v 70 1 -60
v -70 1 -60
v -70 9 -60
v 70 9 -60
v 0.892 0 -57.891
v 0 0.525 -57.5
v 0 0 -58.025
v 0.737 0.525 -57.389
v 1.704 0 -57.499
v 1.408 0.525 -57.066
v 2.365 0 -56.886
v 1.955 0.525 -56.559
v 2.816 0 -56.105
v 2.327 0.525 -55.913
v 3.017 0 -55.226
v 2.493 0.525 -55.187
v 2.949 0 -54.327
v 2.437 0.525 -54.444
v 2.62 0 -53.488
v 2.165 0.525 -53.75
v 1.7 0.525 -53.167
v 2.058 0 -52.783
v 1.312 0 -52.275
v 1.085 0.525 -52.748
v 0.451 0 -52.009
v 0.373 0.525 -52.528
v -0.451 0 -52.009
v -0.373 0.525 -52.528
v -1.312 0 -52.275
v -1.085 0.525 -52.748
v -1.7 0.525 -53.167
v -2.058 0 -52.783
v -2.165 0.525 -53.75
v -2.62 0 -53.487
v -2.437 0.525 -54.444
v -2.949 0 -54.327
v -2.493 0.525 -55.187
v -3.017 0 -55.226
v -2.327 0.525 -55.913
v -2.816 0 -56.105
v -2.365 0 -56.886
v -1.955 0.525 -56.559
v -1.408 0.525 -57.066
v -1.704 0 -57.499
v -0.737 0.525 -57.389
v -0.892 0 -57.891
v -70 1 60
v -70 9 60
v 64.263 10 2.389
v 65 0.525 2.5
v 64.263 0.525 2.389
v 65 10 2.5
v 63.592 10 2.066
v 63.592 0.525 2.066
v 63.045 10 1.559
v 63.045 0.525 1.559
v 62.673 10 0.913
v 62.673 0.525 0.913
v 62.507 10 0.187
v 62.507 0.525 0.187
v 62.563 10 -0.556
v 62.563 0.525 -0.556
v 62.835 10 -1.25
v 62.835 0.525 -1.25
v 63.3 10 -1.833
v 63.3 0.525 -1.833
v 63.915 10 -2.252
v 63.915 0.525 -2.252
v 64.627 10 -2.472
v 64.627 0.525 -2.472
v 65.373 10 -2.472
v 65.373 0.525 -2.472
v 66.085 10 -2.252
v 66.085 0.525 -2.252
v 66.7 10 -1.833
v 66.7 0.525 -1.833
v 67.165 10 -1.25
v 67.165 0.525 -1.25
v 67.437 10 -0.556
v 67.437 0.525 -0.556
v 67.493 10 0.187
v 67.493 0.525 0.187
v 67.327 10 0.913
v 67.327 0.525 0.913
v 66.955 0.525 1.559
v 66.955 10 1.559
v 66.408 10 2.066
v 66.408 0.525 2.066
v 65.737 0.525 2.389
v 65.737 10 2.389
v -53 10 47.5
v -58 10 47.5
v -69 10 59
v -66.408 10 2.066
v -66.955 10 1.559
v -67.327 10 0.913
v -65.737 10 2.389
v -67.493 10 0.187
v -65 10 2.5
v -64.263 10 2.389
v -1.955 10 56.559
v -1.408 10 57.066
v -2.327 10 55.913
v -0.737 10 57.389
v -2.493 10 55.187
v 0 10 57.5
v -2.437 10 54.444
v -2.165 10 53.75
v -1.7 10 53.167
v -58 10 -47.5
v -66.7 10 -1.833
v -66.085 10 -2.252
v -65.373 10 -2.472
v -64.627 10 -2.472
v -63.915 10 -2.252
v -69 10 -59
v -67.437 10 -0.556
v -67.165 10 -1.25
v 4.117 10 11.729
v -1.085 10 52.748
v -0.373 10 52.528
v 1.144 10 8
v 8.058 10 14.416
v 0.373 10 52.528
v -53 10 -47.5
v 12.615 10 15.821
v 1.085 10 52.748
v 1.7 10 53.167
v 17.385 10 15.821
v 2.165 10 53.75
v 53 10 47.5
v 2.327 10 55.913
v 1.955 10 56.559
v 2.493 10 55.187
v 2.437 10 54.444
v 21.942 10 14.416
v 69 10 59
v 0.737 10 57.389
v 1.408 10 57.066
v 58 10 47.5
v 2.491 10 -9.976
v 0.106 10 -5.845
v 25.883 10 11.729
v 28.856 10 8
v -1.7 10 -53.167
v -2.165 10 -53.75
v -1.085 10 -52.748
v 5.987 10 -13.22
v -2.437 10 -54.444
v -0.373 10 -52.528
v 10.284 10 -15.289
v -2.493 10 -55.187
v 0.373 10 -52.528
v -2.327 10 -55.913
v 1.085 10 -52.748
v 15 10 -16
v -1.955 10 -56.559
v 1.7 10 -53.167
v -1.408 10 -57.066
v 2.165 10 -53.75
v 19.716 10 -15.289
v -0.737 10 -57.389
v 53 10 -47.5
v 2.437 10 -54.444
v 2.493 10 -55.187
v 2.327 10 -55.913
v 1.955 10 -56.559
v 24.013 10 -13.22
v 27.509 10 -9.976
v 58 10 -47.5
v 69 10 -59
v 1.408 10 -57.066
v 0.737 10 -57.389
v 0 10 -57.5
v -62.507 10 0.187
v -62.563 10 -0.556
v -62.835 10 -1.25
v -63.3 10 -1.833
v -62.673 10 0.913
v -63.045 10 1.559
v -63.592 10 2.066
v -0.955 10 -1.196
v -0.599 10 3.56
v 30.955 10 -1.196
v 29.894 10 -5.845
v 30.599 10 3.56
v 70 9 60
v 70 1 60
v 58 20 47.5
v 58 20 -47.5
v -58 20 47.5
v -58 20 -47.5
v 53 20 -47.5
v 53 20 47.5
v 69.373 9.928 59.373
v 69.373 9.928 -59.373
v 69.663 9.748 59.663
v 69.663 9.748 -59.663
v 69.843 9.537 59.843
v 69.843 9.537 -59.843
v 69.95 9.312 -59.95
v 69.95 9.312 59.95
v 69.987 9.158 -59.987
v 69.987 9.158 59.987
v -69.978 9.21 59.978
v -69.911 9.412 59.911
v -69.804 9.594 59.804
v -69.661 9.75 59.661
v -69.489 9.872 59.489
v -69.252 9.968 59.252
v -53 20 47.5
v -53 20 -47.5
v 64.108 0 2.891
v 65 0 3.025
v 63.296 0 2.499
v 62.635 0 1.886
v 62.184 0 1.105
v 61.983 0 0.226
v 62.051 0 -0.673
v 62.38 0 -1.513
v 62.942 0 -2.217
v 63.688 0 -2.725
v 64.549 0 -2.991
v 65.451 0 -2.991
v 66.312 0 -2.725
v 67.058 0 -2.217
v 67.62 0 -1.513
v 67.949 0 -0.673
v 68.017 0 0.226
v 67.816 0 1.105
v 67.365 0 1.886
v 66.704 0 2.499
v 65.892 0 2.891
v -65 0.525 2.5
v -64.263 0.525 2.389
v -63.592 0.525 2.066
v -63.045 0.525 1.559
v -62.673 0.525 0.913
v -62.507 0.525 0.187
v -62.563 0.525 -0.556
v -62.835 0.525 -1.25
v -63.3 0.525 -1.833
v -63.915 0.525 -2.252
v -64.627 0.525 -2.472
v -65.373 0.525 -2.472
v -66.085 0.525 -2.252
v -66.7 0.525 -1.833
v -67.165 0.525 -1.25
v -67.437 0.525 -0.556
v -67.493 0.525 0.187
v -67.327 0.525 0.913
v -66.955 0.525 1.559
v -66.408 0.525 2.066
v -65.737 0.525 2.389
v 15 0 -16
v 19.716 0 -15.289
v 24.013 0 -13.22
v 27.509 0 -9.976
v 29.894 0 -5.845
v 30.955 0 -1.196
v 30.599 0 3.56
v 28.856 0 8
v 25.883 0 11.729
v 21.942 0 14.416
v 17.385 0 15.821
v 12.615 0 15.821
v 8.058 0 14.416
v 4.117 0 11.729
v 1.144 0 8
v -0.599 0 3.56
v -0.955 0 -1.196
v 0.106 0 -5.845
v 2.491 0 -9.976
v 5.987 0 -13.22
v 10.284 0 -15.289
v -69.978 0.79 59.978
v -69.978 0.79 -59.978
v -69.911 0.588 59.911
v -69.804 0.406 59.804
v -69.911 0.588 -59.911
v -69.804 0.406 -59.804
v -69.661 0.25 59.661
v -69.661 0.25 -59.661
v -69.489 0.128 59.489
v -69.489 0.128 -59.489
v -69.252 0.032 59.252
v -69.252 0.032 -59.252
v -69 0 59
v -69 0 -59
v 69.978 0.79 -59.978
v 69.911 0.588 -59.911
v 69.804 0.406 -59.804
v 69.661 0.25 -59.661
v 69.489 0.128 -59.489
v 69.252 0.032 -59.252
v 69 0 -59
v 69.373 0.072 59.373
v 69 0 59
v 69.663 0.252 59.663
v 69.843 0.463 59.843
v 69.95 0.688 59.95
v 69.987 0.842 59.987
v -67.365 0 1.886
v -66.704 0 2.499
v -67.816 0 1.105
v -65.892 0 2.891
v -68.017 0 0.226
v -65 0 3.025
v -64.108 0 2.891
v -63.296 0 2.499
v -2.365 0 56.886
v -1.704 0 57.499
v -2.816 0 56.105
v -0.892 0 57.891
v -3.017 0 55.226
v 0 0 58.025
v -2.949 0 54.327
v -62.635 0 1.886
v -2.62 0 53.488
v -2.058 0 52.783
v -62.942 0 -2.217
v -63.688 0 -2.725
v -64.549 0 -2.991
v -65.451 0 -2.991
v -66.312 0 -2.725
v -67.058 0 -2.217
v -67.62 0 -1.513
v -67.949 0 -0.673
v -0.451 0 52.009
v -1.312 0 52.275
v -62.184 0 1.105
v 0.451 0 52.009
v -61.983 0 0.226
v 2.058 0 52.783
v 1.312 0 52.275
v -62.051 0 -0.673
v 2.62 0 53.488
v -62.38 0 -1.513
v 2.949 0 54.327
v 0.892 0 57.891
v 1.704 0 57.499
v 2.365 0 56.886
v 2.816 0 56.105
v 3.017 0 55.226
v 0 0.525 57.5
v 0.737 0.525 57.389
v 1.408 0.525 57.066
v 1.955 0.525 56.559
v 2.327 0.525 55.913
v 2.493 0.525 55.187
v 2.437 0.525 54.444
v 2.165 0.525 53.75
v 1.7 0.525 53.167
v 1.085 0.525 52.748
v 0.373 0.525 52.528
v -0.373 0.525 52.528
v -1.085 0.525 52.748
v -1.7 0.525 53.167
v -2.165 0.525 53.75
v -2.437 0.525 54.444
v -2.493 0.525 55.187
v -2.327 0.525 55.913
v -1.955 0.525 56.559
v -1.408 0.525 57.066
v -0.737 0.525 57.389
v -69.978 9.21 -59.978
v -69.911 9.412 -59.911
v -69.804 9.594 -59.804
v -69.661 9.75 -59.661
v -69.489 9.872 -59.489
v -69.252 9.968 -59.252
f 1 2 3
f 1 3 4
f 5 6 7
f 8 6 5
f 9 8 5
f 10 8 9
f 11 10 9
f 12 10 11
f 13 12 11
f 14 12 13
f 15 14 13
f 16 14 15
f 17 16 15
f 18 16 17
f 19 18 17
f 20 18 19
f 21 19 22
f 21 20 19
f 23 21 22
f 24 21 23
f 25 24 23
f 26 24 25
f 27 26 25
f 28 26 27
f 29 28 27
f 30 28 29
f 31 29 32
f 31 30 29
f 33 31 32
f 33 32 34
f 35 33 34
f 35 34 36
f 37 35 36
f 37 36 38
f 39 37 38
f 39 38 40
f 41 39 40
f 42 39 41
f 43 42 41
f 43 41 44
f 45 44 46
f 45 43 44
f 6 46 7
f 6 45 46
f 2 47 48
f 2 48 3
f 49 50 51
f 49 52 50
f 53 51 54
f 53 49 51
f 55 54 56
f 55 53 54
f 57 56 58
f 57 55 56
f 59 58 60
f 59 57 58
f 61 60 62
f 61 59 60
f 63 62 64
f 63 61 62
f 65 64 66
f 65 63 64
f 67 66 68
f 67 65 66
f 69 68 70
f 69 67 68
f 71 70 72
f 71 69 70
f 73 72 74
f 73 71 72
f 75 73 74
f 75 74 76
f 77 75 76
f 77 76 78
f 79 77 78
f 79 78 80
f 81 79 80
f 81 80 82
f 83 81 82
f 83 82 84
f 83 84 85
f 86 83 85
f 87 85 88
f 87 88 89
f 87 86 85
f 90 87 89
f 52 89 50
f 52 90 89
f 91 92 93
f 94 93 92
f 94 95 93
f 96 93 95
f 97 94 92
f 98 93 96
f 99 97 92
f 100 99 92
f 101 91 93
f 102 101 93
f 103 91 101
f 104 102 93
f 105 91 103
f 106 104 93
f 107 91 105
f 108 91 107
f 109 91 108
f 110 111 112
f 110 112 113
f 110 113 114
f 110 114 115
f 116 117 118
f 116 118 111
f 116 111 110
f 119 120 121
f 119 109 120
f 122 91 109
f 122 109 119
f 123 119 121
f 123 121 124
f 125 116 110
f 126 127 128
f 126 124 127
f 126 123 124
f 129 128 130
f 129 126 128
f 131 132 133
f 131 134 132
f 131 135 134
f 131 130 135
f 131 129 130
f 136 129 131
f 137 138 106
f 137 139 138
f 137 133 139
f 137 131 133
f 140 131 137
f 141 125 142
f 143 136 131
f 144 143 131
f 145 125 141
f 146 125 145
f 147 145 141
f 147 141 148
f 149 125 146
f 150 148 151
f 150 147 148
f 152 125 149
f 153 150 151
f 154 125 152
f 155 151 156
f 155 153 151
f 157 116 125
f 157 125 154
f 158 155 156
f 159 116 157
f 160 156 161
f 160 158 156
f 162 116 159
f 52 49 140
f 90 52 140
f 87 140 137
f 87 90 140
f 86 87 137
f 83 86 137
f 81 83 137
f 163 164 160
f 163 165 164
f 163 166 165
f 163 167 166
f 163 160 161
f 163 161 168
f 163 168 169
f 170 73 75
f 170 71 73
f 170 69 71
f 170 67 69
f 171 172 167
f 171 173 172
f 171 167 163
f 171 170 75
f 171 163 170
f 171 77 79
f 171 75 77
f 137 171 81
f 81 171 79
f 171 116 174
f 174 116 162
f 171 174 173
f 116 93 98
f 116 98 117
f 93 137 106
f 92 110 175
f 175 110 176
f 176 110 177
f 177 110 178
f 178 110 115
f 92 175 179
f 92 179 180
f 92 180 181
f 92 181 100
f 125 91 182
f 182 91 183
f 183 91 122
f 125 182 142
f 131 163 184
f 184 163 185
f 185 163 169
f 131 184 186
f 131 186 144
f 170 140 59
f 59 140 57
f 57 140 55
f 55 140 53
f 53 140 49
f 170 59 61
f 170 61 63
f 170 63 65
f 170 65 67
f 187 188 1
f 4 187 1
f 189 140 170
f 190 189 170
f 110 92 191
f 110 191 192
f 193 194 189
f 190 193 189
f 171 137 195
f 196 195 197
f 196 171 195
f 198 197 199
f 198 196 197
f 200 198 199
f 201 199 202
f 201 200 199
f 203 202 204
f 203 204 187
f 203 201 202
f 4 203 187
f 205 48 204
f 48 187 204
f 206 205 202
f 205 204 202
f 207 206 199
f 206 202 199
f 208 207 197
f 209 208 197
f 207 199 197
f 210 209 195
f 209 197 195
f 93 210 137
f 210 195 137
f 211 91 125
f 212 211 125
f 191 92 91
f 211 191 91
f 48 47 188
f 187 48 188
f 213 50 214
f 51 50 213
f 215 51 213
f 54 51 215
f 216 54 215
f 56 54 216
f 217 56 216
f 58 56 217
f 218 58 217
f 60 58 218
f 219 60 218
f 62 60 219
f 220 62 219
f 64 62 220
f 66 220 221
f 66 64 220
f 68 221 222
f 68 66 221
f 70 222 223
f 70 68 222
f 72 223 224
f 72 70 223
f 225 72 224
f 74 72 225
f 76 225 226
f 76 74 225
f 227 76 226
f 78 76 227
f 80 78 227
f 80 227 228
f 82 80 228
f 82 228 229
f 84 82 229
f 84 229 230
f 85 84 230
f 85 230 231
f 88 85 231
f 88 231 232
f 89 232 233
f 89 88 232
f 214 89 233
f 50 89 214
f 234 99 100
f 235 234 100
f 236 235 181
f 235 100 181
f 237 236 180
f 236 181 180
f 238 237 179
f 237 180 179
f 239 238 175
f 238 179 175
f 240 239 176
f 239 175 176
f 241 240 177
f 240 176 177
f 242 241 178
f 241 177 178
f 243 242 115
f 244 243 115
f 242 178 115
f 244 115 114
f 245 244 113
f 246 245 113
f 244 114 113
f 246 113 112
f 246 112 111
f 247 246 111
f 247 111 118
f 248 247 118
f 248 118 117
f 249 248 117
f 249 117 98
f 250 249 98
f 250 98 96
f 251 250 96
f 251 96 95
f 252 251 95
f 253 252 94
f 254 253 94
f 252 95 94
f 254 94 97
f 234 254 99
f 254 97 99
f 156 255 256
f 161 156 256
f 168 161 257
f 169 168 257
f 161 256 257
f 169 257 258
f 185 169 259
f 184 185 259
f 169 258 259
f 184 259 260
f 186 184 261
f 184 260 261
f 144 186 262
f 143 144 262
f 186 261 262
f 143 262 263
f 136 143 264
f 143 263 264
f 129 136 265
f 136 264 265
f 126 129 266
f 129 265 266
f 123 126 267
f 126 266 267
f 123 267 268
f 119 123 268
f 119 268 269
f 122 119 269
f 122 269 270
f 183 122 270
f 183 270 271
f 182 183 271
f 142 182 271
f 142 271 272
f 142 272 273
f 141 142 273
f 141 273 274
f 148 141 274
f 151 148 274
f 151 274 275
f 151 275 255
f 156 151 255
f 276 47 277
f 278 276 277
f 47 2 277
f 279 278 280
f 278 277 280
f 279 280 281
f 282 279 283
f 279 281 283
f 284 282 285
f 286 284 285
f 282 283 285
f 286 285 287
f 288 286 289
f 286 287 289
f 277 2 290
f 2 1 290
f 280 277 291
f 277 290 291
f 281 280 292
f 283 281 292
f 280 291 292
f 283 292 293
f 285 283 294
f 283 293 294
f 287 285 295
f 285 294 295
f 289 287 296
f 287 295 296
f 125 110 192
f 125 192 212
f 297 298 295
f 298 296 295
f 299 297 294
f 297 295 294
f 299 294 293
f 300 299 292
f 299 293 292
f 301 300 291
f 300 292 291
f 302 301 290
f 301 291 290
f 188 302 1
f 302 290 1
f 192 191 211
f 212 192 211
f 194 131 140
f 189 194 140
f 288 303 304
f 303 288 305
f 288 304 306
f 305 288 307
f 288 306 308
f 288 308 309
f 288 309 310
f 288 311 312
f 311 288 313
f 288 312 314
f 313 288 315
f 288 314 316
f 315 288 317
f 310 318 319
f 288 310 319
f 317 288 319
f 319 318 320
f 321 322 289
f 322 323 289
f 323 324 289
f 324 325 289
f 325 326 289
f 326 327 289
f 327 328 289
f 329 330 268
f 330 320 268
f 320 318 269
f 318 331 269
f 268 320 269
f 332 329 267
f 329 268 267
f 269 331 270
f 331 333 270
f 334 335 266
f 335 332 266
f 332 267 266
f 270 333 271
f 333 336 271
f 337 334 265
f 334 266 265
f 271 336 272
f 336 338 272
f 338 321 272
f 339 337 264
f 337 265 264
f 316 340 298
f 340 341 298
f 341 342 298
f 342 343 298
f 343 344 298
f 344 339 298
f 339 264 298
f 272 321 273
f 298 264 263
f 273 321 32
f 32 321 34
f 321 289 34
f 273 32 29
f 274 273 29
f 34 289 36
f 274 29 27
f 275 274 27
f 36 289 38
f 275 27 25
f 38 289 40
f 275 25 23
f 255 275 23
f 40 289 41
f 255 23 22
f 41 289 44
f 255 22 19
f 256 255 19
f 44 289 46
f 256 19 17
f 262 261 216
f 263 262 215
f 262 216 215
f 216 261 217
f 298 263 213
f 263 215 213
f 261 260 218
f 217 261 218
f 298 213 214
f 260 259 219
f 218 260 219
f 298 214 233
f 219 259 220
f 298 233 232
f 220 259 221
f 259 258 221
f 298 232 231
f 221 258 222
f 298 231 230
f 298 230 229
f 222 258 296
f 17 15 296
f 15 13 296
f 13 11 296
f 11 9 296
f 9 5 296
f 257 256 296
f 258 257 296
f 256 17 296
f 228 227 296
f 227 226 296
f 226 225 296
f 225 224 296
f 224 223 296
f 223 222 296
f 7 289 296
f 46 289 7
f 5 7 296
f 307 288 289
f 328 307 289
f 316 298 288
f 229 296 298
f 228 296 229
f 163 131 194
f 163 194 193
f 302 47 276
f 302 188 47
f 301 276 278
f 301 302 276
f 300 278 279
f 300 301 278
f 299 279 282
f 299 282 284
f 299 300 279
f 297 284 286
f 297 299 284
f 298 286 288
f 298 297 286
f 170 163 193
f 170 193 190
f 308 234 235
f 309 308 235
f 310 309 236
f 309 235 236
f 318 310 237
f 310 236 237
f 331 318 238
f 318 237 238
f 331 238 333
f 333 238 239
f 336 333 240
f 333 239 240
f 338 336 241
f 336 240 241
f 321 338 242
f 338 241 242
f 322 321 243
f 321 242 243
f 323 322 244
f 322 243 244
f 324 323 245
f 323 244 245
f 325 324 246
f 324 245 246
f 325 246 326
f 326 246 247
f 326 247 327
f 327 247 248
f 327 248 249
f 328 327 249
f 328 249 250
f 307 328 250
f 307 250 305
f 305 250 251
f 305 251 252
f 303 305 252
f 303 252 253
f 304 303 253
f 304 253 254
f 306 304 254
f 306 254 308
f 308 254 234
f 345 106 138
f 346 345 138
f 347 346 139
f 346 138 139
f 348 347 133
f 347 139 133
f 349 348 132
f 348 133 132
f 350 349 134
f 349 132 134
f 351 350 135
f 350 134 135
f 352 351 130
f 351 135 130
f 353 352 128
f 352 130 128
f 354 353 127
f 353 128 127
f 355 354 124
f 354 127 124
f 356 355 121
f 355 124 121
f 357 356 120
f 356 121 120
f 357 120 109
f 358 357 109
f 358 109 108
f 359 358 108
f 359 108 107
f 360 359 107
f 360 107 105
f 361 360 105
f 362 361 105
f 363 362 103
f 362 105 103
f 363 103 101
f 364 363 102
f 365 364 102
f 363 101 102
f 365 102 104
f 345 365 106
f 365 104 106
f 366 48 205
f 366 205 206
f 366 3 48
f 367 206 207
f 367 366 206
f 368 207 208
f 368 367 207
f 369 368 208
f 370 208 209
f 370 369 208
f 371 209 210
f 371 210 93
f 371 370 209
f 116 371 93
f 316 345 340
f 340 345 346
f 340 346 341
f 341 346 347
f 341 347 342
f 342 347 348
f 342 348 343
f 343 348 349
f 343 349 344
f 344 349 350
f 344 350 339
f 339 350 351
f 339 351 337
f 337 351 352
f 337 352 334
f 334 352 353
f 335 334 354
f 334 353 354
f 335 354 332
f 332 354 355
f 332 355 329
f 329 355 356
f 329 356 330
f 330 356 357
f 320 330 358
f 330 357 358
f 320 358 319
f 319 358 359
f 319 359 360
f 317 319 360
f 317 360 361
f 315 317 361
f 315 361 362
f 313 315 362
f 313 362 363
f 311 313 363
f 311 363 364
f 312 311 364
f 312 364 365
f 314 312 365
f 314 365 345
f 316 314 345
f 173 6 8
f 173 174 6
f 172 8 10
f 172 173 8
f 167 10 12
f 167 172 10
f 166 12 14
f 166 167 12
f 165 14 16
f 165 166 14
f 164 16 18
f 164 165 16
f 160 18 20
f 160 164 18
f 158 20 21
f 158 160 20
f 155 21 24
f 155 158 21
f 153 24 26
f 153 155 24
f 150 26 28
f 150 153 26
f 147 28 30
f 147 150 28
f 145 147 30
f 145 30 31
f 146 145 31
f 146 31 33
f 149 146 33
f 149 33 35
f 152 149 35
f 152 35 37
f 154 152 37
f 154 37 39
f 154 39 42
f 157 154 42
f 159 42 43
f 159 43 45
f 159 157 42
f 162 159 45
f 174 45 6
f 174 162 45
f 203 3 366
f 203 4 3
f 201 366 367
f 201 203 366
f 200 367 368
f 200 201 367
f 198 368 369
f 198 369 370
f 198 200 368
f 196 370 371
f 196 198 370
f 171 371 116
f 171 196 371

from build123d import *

# Parameters (mm, degrees)
SKETCH1_W                   = 140
SKETCH1_H                   = 120
LID_EXTRUDE_DEPTH           = 10
SKETCH3_W                   = 5
SKETCH3_H                   = 95
LOCATION_BAR_EXTRUDE_DEPTH  = 10
M6_TAPPED_HOLE1_D           = 5
M6_TAPPED_HOLE1_CSINK_D     = 6.05
M6_TAPPED_HOLE1_CSINK_ANGLE = 90
MOTOR_HOLE_CUT_REACH        = 96.34
SKETCH6_R                   = 16
FILLET2_R                   = 1


with BuildPart() as part:
    # Sketch1 → LID_EXTRUDE (new body)
    with BuildSketch(Plane(origin=(0, 0, 0), x_dir=(1, 0, 0), z_dir=(0, 1, 0))):
        Rectangle(SKETCH1_W, SKETCH1_H)
    extrude(amount=LID_EXTRUDE_DEPTH)

    # Sketch3 → LOCATION_BAR_EXTRUDE (add)
    with BuildSketch(Plane(origin=(0, 10, 0), x_dir=(1, 0, 0), z_dir=(0, 1, 0))):
        with Locations((-55.5, 0)):
            Rectangle(SKETCH3_W, SKETCH3_H)
        with Locations((55.5, 0)):
            Rectangle(SKETCH3_W, SKETCH3_H)
    extrude(amount=LOCATION_BAR_EXTRUDE_DEPTH)

    # M6 Tapped Hole1 (through all)
    with Locations(Plane(origin=(0, 0, 55), x_dir=(0, 0, -1), z_dir=(0, -1, 0))):
        with Locations((0, 0), (55, -65)):
            m6_tapped_hole1 = CounterSinkHole(M6_TAPPED_HOLE1_D / 2, M6_TAPPED_HOLE1_CSINK_D / 2, counter_sink_angle=M6_TAPPED_HOLE1_CSINK_ANGLE)

    # Mirror1: M6 Tapped Hole1 across plane
    add(m6_tapped_hole1.mirror(Plane(origin=(0, 0, 0), x_dir=(0, 0, 1), z_dir=(1, 0, 0))), mode=Mode.SUBTRACT)

    # Mirror1 at the second plane: M6 Tapped Hole1 across plane
    add(m6_tapped_hole1.mirror(Plane.XY), mode=Mode.SUBTRACT)

    # Sketch6 → MOTOR_HOLE_CUT (cut, up to next)
    with BuildSketch(Plane.XZ, mode=Mode.PRIVATE) as motor_hole_cut_sk1:
        with Locations(Location((15, 0, 0), (0, 0, 270))):
            Circle(SKETCH6_R)
    motor_hole_cut_tool1 = extrude(motor_hole_cut_sk1.sketch, amount=-MOTOR_HOLE_CUT_REACH, mode=Mode.PRIVATE) & part.part
    add(motor_hole_cut_tool1.solids().sort_by_distance((15, 0, 0))[0], mode=Mode.SUBTRACT)

    # Fillet2
    fillet2_edges = [part.edges().sort_by_distance(p)[0] for p in [
        (70, 10, 0),
        (0, 10, -60),
        (-70, 10, 0),
        (0, 0, -60),
        (70, 0, 0),
        (0, 0, 60),
        (-70, 0, 0),
        (0, 10, 60),
    ]]
    fillet(fillet2_edges, radius=FILLET2_R)


solid = part.part
